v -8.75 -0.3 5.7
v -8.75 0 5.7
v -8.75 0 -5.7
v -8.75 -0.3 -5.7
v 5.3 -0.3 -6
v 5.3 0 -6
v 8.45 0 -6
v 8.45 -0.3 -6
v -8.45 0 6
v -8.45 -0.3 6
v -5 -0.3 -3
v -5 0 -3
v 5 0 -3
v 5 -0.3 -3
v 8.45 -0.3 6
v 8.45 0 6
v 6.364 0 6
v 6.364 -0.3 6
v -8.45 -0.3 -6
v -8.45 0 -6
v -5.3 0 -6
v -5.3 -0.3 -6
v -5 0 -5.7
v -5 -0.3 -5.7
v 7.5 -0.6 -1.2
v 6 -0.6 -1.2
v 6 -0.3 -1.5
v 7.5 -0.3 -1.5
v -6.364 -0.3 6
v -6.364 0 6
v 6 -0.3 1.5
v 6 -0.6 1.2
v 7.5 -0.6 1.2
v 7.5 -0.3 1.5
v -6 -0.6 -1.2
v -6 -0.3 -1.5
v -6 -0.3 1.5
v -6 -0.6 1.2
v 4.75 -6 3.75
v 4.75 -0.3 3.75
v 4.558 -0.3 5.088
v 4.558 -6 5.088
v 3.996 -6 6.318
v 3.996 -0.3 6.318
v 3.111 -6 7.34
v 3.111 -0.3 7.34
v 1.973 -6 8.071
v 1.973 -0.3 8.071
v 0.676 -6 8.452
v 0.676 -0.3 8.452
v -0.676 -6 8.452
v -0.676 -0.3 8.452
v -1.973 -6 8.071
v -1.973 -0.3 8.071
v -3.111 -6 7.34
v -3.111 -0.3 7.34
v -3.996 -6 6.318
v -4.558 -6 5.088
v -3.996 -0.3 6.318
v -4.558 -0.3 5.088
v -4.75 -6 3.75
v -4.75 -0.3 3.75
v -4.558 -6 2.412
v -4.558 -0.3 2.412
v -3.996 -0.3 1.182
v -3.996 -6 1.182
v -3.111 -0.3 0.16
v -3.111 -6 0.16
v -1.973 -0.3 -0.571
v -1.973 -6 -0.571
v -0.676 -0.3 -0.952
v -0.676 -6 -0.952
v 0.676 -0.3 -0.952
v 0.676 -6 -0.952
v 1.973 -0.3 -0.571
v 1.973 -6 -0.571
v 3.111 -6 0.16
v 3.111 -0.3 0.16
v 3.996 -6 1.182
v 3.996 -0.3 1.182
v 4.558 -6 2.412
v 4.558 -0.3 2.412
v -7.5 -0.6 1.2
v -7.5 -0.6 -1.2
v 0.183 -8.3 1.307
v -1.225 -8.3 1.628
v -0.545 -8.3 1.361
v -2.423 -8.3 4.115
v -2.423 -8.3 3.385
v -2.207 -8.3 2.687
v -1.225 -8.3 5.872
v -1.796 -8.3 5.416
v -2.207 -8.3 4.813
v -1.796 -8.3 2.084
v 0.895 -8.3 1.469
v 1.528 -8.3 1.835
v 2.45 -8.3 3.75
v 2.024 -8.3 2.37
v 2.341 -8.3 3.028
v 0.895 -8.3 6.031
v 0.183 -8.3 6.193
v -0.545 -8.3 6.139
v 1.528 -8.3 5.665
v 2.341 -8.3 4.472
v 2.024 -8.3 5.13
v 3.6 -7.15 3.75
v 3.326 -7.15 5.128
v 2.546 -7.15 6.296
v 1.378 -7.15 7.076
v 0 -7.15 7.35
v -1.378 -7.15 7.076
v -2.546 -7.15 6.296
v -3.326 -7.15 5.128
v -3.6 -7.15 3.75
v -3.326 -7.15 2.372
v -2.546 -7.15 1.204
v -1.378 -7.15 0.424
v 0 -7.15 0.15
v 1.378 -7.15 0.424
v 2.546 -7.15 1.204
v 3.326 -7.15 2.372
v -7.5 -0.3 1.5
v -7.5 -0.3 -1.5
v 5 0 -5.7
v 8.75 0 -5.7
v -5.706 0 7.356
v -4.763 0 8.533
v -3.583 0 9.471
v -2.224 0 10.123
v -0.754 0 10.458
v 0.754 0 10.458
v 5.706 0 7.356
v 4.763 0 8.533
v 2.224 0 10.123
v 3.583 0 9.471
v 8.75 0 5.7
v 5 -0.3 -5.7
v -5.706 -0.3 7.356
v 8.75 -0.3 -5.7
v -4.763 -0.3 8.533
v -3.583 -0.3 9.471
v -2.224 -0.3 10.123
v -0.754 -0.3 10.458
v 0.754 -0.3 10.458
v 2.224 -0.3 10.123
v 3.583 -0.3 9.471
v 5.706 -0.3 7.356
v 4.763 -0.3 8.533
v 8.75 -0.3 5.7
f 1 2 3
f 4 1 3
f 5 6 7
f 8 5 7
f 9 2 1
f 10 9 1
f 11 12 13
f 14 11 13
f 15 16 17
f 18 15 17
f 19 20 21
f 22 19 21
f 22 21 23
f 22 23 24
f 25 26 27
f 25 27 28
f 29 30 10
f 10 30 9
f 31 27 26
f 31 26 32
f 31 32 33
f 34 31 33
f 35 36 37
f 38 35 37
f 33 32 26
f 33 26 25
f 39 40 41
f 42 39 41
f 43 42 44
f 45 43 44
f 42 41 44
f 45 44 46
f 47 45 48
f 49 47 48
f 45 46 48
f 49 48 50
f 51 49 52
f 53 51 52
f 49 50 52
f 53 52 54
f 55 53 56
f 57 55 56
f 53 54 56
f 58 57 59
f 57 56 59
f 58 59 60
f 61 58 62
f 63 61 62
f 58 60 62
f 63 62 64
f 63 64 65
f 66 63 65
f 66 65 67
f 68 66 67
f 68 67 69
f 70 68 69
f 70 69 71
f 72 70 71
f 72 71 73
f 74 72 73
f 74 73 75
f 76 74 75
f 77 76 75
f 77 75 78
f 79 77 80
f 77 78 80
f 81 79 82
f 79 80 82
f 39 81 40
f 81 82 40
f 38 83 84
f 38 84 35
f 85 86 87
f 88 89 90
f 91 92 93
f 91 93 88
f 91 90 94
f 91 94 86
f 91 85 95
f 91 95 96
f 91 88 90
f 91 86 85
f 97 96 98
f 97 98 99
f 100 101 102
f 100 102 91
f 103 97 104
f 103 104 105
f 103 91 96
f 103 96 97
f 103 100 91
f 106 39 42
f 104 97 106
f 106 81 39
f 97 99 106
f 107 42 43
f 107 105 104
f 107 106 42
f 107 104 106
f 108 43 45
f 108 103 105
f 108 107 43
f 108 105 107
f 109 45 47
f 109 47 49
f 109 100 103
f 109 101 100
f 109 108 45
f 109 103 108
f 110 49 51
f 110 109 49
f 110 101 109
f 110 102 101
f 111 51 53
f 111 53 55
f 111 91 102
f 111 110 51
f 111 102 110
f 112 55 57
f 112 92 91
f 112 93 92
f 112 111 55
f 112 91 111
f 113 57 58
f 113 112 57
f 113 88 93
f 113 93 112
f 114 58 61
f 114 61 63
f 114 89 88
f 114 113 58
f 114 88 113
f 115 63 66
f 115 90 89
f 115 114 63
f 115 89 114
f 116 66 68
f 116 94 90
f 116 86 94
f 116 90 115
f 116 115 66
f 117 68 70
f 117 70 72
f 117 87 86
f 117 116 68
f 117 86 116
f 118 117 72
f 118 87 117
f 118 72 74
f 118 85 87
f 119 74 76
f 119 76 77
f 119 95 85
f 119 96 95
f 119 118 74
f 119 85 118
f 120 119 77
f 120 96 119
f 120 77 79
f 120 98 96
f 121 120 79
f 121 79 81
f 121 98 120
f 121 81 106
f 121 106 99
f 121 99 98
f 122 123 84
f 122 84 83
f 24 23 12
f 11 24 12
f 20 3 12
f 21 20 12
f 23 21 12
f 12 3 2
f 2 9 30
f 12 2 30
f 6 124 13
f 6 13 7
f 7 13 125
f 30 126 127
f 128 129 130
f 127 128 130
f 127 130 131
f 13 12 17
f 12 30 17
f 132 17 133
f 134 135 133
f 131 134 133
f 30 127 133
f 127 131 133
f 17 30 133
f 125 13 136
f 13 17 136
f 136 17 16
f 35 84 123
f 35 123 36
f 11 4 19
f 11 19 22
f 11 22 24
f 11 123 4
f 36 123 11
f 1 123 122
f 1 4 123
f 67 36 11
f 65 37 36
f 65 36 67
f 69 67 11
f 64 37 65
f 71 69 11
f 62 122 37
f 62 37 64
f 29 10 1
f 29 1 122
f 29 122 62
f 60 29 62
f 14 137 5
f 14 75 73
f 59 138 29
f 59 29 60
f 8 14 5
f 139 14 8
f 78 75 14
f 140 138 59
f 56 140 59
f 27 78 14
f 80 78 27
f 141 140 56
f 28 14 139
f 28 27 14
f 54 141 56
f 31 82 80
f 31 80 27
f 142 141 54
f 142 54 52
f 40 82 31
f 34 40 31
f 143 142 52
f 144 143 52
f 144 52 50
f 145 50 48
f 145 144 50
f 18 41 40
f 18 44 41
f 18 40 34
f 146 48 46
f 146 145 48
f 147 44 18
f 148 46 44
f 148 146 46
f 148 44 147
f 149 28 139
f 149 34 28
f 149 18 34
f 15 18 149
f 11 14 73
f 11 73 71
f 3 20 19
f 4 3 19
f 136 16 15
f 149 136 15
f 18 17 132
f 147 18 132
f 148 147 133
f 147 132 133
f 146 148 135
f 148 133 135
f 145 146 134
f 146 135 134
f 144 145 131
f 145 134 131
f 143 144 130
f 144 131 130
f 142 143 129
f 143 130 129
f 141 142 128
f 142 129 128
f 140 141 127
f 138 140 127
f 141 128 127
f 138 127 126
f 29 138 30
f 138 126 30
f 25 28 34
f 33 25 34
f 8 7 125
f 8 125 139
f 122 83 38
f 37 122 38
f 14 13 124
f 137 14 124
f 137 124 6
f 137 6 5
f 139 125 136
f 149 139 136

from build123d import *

# Parameters (mm, degrees)
F0_W     = 1.5
F0_H     = 3
F1_DEPTH = 0.3
F2_DEPTH = 0.6
F3_R     = 4.75
F4_DEPTH = 8
F5_SIZE  = 2.3
F6_SIZE  = 0.29999


# Not quite as in the source:
# - a fillet or chamfer is up to 0.001 mm smaller than in the source, because OpenCascade refuses the exact size


with BuildPart() as f1:
    # F0 (on Front) → F1 (new body)
    with BuildSketch(Plane.XZ):
        with BuildLine():
            Line((8.75, -6), (8.75, 6))
            Line((8.75, 6), (6.3639610307, 6))
            ThreePointArc((6.3639610307, 6), (0, 10.5), (-6.3639610307, 6))
            Line((-6.3639610307, 6), (-8.75, 6))
            Line((-8.75, 6), (-8.75, -6))
            Line((-8.75, -6), (-5, -6))
            Line((-5, -6), (-5, -3))
            Line((-5, -3), (5, -3))
            Line((5, -3), (5, -6))
            Line((5, -6), (8.75, -6))
        make_face()
        with Locations((-6.75, 0)):
            Rectangle(F0_W, F0_H, mode=Mode.SUBTRACT)
        with Locations((6.75, 0)):
            Rectangle(F0_W, F0_H, mode=Mode.SUBTRACT)
        with Locations((-6.75, 0)):
            Rectangle(F0_W, F0_H)
        with Locations((6.75, 0)):
            Rectangle(F0_W, F0_H)
    extrude(amount=F1_DEPTH)

    # F0 (on Front) → F2 (join)
    with BuildSketch(Plane.XZ):
        with Locations((-6.75, 0)):
            Rectangle(F0_W, F0_H)
        with Locations((6.75, 0)):
            Rectangle(F0_W, F0_H)
    extrude(amount=F2_DEPTH)

    # F3 (on face) → F4 (join)
    with BuildSketch(Plane.XZ.offset(0.3)):
        with Locations((0, 3.75)):
            Circle(F3_R)
    extrude(amount=F4_DEPTH)

    # F5
    f5_edges = [f1.edges().sort_by_distance(p)[0] for p in [
        (-4.75, -8.3, 3.75),
    ]]
    chamfer(f5_edges, length=F5_SIZE)

    # F6 (size 0.3 in the source; OpenCascade refuses exactly that, so slightly less here)
    f6_edges = [f1.edges().sort_by_distance(p)[0] for p in [
        (-6.75, -0.6, -1.5),
        (-6.75, -0.6, 1.5),
        (6.75, -0.6, -1.5),
        (6.75, -0.6, 1.5),
        (-5, -0.15, -6),
        (-8.75, -0.15, -6),
        (5, -0.15, -6),
        (8.75, -0.15, -6),
        (8.75, -0.15, 6),
        (-8.75, -0.15, 6),
    ]]
    chamfer(f6_edges, length=F6_SIZE)


solid = f1.part
